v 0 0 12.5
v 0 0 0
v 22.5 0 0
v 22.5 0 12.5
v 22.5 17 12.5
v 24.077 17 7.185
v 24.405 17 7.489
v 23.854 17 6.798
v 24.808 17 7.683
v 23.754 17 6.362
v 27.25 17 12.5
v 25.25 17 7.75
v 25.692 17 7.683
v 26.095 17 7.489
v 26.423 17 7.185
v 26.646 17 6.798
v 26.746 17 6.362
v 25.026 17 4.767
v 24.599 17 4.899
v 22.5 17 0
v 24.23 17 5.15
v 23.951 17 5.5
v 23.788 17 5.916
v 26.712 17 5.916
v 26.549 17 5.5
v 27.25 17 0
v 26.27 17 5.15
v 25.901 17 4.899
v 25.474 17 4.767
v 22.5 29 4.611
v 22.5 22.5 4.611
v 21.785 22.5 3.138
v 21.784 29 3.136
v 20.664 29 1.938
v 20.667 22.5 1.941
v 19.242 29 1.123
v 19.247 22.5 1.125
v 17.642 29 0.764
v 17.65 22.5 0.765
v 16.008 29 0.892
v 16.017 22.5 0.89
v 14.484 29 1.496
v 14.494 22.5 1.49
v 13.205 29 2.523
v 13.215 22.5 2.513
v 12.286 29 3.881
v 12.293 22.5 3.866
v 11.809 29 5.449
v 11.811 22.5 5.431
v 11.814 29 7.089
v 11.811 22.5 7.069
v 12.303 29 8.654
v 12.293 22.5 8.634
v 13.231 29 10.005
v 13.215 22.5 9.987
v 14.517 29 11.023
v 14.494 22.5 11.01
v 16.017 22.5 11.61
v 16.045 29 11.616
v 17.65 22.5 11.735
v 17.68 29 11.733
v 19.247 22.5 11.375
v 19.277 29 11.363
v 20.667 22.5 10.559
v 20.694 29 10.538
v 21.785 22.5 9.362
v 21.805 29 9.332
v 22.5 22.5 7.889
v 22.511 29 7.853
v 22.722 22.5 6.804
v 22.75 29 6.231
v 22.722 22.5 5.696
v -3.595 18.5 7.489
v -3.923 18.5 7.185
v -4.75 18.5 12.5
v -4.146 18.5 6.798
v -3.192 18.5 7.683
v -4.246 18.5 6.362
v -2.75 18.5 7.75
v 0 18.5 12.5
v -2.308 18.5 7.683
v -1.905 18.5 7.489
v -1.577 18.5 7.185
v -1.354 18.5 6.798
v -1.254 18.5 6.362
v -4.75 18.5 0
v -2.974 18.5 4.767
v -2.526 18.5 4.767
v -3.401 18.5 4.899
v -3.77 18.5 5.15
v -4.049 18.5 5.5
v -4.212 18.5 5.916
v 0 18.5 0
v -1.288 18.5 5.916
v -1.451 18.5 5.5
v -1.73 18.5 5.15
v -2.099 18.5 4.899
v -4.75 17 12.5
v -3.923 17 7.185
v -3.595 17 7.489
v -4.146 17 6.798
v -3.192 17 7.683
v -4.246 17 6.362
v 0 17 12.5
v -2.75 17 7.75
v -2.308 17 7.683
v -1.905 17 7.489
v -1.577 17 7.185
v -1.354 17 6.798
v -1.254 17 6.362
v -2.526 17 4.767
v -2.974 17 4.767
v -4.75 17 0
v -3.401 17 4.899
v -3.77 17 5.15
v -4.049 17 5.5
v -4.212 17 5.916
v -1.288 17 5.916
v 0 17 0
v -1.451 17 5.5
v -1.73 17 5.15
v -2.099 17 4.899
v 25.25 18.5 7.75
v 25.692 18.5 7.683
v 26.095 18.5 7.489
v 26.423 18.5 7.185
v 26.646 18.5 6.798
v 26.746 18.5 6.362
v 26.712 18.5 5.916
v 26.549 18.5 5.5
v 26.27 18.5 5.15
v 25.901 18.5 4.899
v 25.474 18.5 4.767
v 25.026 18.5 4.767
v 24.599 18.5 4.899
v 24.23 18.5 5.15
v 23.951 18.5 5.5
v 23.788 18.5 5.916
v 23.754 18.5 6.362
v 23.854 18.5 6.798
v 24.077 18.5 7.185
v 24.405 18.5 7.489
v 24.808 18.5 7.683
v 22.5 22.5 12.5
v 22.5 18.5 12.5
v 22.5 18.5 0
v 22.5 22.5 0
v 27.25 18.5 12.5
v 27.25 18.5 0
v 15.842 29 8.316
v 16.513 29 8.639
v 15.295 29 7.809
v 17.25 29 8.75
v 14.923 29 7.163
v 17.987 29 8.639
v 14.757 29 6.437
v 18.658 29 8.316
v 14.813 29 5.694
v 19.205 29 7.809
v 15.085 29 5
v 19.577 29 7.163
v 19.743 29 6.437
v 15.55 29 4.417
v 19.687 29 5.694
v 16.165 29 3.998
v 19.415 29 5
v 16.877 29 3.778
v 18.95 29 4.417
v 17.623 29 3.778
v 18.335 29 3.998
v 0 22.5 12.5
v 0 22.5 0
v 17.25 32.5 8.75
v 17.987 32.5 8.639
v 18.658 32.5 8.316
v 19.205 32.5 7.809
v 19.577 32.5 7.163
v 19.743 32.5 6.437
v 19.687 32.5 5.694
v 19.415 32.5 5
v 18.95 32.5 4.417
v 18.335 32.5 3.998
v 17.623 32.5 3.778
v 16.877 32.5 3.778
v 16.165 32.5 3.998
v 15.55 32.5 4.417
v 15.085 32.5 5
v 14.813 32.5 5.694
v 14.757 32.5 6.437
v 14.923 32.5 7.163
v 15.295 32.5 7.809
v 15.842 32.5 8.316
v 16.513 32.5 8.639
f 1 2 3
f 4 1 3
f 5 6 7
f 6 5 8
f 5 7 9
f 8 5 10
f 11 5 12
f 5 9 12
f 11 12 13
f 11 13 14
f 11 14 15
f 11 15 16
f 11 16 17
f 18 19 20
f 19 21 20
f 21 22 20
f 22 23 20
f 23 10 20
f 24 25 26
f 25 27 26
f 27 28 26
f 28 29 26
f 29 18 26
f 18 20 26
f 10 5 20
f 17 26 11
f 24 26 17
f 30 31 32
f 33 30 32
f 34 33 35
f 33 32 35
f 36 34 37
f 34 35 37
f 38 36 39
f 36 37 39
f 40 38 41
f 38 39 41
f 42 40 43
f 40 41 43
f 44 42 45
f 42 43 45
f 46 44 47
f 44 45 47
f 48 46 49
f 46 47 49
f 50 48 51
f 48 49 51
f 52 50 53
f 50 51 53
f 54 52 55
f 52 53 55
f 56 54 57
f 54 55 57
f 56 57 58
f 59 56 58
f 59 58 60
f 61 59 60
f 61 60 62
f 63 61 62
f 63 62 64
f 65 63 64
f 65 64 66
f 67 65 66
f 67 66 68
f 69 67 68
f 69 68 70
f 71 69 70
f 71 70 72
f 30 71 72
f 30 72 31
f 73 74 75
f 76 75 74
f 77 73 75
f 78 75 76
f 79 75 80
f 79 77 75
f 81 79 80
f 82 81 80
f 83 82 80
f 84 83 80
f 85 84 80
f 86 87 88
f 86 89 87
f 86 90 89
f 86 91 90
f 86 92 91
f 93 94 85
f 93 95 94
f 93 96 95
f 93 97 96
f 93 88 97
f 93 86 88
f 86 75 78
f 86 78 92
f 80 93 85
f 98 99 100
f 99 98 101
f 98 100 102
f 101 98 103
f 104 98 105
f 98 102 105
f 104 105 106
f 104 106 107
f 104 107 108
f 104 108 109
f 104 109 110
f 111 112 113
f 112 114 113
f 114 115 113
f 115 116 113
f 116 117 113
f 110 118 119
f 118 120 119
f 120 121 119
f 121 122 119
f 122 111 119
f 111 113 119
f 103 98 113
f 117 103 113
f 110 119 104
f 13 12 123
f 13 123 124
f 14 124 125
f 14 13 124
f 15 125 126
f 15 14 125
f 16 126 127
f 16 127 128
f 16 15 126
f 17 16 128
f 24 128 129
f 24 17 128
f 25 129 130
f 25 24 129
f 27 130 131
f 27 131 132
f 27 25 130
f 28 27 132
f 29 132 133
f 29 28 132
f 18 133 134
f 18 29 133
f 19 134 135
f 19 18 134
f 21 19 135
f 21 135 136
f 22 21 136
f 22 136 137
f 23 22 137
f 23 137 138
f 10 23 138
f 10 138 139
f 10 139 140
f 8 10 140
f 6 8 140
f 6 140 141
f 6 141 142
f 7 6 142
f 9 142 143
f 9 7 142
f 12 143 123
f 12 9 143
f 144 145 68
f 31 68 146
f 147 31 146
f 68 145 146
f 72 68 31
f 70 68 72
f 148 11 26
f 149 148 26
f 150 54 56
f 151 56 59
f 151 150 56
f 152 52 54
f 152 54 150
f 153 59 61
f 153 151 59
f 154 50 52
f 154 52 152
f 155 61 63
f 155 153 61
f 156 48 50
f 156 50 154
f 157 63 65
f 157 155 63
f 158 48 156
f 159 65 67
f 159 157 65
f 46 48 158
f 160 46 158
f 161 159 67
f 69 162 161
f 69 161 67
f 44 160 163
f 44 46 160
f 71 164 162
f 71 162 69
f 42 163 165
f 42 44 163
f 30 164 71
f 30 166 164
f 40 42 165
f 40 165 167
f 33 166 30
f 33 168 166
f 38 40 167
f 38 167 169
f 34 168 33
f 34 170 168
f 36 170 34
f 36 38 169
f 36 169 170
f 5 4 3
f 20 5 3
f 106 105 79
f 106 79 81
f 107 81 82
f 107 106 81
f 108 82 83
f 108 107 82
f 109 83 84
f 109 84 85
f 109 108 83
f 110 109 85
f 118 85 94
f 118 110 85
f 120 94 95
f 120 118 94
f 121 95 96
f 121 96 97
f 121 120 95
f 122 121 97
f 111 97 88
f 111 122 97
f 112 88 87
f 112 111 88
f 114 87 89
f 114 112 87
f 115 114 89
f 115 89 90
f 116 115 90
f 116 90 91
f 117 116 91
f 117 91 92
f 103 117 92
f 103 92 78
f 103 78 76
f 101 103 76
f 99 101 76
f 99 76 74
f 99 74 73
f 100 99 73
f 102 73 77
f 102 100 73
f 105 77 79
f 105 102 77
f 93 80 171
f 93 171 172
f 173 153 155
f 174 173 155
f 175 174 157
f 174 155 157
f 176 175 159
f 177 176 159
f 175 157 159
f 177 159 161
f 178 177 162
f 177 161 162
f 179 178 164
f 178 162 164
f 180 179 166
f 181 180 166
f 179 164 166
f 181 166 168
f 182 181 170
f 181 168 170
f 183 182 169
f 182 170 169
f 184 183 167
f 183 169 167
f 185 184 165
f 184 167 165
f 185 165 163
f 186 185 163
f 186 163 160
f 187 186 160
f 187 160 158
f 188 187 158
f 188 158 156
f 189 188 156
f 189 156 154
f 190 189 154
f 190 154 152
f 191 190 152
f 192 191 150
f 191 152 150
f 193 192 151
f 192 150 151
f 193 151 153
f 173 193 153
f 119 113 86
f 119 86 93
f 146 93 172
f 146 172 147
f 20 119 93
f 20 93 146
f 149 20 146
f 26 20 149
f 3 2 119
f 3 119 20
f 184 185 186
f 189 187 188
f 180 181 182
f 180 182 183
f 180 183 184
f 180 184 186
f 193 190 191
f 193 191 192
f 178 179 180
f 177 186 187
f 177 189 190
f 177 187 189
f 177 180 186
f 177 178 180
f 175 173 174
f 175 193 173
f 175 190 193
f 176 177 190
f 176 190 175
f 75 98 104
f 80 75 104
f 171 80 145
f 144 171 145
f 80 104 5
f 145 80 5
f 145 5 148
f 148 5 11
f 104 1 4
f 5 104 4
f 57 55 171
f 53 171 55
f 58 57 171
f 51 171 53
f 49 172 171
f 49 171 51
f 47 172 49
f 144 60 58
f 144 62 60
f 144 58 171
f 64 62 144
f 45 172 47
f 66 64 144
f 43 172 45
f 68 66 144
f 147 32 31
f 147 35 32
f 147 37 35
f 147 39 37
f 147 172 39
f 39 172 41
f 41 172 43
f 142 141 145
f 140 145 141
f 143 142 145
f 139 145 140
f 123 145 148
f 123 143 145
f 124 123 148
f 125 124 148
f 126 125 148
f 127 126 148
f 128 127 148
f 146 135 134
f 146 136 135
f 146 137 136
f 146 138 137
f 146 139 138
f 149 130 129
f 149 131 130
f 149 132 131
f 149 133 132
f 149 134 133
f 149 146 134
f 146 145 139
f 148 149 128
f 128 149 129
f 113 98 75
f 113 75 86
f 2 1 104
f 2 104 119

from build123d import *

# Parameters (mm, degrees)
SKETCH_1_W      = 22.5
SKETCH_1_H      = 12.5
EXTRUDE_1_DEPTH = 17
SKETCH_2_W      = 32
SKETCH_2_H      = 12.5
SKETCH_2_R      = 1.5
EXTRUDE_2_DEPTH = 1.5
SKETCH_3_W      = 22.5
SKETCH_3_H      = 12.5
EXTRUDE_3_DEPTH = 4
SKETCH_4_R      = 5.5
EXTRUDE_4_DEPTH = 6.5
SKETCH_5_R      = 2.5
EXTRUDE_5_DEPTH = 3.5


with BuildPart() as part:
    # 草图1 → 凸台-拉伸1 (new body)
    with BuildSketch(Plane(origin=(0, 0, 0), x_dir=(1, 0, 0), z_dir=(0, 1, 0))):
        with Locations((11.25, -6.25)):
            Rectangle(SKETCH_1_W, SKETCH_1_H)
    extrude(amount=EXTRUDE_1_DEPTH)

    # 草图2 → 凸台-拉伸2 (add)
    with BuildSketch(Plane(origin=(0, 17, 0), x_dir=(1, 0, 0), z_dir=(0, 1, 0))):
        with Locations((11.25, -6.25)):
            Rectangle(SKETCH_2_W, SKETCH_2_H)
        with Locations(Location((-2.75, -6.25, 0), (0, 0, 270))):
            Circle(SKETCH_2_R, mode=Mode.SUBTRACT)
        with Locations(Location((25.25, -6.25, 0), (0, 0, 270))):
            Circle(SKETCH_2_R, mode=Mode.SUBTRACT)
    extrude(amount=EXTRUDE_2_DEPTH)

    # 草图3 → 凸台-拉伸3 (add)
    with BuildSketch(Plane(origin=(0, 18.5, 0), x_dir=(1, 0, 0), z_dir=(0, 1, 0))):
        with Locations((11.25, -6.25)):
            Rectangle(SKETCH_3_W, SKETCH_3_H)
    extrude(amount=EXTRUDE_3_DEPTH)

    # 草图4 → 凸台-拉伸4 (add)
    with BuildSketch(Plane(origin=(0, 22.5, 0), x_dir=(1, 0, 0), z_dir=(0, 1, 0))):
        with Locations(Location((17.25, -6.25, 0), (0, 0, 17.341442803))):
            Circle(SKETCH_4_R)
    extrude(amount=EXTRUDE_4_DEPTH)

    # 草图5 → 凸台-拉伸5 (add)
    with BuildSketch(Plane(origin=(0, 29, 0), x_dir=(1, 0, 0), z_dir=(0, 1, 0))):
        with Locations(Location((17.25, -6.25, 0), (0, 0, 270))):
            Circle(SKETCH_5_R)
    extrude(amount=EXTRUDE_5_DEPTH)


solid = part.part
